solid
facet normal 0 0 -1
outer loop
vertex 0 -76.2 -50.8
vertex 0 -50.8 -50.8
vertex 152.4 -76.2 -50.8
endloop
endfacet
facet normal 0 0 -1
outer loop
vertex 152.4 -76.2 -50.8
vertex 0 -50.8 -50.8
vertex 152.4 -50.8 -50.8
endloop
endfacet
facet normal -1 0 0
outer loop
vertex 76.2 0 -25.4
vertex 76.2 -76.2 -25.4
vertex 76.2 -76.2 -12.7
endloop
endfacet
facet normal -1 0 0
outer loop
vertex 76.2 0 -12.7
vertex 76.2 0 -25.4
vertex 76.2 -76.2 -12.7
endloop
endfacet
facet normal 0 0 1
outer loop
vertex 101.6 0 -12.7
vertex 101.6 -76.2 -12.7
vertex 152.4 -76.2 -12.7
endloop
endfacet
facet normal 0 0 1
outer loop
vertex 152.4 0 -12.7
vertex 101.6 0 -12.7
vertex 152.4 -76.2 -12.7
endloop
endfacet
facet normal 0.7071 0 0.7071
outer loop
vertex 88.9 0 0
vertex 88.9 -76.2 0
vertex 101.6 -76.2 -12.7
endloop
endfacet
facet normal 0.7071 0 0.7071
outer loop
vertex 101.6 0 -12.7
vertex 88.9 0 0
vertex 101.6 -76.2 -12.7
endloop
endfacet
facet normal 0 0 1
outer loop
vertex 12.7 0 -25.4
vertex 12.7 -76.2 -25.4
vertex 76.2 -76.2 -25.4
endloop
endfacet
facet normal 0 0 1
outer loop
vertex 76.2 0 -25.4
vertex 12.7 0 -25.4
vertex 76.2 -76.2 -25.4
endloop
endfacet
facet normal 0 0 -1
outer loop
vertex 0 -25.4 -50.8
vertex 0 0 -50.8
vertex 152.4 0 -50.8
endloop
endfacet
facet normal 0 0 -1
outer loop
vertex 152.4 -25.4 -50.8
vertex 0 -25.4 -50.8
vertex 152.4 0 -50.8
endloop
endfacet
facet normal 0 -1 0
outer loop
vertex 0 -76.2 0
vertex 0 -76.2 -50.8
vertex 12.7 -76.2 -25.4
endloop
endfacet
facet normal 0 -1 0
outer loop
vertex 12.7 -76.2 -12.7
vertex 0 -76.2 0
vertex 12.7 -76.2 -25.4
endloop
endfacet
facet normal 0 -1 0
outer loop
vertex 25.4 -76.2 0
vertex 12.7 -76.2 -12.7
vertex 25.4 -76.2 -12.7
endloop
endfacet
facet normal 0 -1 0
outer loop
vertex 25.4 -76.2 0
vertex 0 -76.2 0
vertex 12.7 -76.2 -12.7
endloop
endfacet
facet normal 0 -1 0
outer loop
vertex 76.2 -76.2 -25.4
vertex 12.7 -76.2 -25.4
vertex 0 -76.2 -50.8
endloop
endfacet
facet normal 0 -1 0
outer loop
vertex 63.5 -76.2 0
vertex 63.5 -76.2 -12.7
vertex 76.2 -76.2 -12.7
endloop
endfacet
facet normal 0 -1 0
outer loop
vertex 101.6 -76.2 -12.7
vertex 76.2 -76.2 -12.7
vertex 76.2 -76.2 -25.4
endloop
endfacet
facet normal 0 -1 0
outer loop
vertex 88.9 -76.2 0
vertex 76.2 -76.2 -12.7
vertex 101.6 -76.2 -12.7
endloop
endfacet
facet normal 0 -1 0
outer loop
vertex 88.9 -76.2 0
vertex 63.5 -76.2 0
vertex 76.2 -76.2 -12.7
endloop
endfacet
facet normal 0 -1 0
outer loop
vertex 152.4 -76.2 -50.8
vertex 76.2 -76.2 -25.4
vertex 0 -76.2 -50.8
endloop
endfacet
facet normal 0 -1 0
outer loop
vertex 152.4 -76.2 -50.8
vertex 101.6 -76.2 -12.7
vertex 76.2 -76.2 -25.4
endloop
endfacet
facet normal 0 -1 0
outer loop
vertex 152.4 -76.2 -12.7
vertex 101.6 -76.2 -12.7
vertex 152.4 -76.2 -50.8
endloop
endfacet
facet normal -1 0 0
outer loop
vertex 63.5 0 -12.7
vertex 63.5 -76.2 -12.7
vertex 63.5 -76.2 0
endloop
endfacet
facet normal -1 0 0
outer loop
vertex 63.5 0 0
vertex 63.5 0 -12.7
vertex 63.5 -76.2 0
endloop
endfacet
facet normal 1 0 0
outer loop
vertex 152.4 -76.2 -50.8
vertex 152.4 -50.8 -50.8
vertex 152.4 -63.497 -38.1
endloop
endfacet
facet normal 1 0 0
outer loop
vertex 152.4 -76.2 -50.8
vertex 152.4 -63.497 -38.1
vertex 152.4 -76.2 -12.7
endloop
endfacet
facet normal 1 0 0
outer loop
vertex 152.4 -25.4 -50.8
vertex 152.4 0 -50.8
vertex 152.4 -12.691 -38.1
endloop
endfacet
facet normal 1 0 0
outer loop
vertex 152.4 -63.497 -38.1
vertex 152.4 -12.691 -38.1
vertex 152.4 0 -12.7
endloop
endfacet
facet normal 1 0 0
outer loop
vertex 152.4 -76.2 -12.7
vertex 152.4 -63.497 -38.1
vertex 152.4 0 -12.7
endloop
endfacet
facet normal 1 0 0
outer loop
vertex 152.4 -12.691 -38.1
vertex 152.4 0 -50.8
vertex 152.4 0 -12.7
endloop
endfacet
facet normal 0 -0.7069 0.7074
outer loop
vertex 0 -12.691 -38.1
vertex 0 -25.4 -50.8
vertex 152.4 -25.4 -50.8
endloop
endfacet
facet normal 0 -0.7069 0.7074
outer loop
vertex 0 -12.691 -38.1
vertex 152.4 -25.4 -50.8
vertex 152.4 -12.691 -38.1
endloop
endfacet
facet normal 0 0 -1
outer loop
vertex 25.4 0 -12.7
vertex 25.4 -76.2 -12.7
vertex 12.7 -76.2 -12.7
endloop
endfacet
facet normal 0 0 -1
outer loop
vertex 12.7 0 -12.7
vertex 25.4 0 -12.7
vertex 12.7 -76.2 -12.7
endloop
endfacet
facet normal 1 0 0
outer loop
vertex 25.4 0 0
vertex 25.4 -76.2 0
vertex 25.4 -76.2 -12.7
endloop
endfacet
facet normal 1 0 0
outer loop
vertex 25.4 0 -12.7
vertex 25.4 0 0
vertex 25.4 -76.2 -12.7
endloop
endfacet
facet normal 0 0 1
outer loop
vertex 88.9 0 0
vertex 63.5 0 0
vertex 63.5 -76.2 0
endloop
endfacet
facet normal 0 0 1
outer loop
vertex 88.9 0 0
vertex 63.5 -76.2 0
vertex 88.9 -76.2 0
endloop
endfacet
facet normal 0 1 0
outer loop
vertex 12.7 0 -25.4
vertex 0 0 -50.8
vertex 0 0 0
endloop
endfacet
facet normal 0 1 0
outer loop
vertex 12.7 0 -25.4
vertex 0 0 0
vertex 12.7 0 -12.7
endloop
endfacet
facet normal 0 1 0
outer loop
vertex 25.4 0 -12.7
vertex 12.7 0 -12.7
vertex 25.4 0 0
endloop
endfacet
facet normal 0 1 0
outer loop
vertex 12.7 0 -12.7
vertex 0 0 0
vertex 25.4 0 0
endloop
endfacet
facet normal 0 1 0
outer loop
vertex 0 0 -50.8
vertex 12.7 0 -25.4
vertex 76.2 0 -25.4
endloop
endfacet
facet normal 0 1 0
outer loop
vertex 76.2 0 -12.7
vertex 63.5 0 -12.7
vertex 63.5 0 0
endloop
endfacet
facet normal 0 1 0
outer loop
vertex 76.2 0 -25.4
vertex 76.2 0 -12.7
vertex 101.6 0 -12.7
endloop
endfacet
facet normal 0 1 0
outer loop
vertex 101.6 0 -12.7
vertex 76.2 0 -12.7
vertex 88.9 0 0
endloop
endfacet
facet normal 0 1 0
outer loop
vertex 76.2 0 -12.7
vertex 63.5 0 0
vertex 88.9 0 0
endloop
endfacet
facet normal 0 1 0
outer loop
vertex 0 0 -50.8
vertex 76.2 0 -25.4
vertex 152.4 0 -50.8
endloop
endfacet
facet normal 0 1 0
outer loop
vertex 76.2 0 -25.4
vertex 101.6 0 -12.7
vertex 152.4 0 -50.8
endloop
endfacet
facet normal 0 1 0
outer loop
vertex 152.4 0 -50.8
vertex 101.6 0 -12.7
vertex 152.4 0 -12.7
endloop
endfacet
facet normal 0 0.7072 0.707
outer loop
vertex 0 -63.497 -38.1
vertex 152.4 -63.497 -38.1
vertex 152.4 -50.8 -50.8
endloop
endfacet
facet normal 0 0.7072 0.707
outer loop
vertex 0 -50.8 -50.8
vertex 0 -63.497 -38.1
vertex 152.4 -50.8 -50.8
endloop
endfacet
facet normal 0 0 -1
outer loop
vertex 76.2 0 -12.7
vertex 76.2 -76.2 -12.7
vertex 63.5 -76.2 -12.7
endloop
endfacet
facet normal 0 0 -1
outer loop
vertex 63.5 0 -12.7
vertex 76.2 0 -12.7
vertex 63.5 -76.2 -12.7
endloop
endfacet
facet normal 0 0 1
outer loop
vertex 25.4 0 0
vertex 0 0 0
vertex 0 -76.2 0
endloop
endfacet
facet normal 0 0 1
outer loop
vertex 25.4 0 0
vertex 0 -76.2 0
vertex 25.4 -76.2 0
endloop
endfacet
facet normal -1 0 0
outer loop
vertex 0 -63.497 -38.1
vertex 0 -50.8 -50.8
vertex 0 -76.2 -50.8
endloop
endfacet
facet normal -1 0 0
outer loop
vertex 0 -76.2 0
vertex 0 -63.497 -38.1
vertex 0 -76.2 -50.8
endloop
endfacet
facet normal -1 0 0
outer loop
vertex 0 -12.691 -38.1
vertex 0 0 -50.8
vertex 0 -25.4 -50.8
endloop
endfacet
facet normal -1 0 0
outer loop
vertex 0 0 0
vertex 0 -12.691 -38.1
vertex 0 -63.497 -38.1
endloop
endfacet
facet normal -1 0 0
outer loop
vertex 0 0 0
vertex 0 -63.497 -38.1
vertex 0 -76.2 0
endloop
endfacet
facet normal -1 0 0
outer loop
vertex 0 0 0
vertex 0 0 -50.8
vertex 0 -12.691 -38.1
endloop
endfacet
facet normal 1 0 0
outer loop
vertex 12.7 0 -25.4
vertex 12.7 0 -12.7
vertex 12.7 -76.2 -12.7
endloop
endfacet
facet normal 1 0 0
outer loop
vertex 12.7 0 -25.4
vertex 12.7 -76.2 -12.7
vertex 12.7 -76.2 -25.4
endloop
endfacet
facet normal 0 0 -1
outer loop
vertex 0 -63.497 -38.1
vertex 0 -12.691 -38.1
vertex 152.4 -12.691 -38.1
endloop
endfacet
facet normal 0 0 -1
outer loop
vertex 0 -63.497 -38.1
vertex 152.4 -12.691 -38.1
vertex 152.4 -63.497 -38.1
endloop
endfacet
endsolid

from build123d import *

# Parameters (mm, degrees)
F0_W     = 152.4
F0_H     = 50.8
F1_DEPTH = 76.2
F3_DEPTH = 76.2
F5_DEPTH = 76.2
F7_DEPTH = 152.4


with BuildPart() as f1:
    # F0 (on Front) → F1 (new body)
    with BuildSketch(Plane.XZ):
        with Locations((76.2, -25.4)):
            Rectangle(F0_W, F0_H)
    extrude(amount=F1_DEPTH)

    # F2 (on face) → F3 (cut)
    with BuildSketch(Plane.XZ.offset(76.2)):
        Polygon((152.4, -12.7), (152.4, 0), (88.9, 0), (101.6, -12.7), align=None)
    extrude(amount=-F3_DEPTH, mode=Mode.SUBTRACT)

    # F4 (on face) → F5 (cut)
    with BuildSketch(Plane.XZ.offset(76.2)):
        Polygon((63.5, 0), (25.4, 0), (25.4, -12.7), (12.7, -12.7), (12.7, -25.4), (76.2, -25.4), (76.2, -12.7), (63.5, -12.7), align=None)
    extrude(amount=-F5_DEPTH, mode=Mode.SUBTRACT)

    # F6 (on face) → F7 (cut)
    with BuildSketch(Plane.YZ.offset(152.4)):
        Polygon((-63.497171, -38.1), (-50.8, -50.8), (-25.4, -50.8), (-12.691214, -38.1), (-25.4, -38.1), (-50.8, -38.1), align=None)
    extrude(amount=-F7_DEPTH, mode=Mode.SUBTRACT)


solid = f1.part
